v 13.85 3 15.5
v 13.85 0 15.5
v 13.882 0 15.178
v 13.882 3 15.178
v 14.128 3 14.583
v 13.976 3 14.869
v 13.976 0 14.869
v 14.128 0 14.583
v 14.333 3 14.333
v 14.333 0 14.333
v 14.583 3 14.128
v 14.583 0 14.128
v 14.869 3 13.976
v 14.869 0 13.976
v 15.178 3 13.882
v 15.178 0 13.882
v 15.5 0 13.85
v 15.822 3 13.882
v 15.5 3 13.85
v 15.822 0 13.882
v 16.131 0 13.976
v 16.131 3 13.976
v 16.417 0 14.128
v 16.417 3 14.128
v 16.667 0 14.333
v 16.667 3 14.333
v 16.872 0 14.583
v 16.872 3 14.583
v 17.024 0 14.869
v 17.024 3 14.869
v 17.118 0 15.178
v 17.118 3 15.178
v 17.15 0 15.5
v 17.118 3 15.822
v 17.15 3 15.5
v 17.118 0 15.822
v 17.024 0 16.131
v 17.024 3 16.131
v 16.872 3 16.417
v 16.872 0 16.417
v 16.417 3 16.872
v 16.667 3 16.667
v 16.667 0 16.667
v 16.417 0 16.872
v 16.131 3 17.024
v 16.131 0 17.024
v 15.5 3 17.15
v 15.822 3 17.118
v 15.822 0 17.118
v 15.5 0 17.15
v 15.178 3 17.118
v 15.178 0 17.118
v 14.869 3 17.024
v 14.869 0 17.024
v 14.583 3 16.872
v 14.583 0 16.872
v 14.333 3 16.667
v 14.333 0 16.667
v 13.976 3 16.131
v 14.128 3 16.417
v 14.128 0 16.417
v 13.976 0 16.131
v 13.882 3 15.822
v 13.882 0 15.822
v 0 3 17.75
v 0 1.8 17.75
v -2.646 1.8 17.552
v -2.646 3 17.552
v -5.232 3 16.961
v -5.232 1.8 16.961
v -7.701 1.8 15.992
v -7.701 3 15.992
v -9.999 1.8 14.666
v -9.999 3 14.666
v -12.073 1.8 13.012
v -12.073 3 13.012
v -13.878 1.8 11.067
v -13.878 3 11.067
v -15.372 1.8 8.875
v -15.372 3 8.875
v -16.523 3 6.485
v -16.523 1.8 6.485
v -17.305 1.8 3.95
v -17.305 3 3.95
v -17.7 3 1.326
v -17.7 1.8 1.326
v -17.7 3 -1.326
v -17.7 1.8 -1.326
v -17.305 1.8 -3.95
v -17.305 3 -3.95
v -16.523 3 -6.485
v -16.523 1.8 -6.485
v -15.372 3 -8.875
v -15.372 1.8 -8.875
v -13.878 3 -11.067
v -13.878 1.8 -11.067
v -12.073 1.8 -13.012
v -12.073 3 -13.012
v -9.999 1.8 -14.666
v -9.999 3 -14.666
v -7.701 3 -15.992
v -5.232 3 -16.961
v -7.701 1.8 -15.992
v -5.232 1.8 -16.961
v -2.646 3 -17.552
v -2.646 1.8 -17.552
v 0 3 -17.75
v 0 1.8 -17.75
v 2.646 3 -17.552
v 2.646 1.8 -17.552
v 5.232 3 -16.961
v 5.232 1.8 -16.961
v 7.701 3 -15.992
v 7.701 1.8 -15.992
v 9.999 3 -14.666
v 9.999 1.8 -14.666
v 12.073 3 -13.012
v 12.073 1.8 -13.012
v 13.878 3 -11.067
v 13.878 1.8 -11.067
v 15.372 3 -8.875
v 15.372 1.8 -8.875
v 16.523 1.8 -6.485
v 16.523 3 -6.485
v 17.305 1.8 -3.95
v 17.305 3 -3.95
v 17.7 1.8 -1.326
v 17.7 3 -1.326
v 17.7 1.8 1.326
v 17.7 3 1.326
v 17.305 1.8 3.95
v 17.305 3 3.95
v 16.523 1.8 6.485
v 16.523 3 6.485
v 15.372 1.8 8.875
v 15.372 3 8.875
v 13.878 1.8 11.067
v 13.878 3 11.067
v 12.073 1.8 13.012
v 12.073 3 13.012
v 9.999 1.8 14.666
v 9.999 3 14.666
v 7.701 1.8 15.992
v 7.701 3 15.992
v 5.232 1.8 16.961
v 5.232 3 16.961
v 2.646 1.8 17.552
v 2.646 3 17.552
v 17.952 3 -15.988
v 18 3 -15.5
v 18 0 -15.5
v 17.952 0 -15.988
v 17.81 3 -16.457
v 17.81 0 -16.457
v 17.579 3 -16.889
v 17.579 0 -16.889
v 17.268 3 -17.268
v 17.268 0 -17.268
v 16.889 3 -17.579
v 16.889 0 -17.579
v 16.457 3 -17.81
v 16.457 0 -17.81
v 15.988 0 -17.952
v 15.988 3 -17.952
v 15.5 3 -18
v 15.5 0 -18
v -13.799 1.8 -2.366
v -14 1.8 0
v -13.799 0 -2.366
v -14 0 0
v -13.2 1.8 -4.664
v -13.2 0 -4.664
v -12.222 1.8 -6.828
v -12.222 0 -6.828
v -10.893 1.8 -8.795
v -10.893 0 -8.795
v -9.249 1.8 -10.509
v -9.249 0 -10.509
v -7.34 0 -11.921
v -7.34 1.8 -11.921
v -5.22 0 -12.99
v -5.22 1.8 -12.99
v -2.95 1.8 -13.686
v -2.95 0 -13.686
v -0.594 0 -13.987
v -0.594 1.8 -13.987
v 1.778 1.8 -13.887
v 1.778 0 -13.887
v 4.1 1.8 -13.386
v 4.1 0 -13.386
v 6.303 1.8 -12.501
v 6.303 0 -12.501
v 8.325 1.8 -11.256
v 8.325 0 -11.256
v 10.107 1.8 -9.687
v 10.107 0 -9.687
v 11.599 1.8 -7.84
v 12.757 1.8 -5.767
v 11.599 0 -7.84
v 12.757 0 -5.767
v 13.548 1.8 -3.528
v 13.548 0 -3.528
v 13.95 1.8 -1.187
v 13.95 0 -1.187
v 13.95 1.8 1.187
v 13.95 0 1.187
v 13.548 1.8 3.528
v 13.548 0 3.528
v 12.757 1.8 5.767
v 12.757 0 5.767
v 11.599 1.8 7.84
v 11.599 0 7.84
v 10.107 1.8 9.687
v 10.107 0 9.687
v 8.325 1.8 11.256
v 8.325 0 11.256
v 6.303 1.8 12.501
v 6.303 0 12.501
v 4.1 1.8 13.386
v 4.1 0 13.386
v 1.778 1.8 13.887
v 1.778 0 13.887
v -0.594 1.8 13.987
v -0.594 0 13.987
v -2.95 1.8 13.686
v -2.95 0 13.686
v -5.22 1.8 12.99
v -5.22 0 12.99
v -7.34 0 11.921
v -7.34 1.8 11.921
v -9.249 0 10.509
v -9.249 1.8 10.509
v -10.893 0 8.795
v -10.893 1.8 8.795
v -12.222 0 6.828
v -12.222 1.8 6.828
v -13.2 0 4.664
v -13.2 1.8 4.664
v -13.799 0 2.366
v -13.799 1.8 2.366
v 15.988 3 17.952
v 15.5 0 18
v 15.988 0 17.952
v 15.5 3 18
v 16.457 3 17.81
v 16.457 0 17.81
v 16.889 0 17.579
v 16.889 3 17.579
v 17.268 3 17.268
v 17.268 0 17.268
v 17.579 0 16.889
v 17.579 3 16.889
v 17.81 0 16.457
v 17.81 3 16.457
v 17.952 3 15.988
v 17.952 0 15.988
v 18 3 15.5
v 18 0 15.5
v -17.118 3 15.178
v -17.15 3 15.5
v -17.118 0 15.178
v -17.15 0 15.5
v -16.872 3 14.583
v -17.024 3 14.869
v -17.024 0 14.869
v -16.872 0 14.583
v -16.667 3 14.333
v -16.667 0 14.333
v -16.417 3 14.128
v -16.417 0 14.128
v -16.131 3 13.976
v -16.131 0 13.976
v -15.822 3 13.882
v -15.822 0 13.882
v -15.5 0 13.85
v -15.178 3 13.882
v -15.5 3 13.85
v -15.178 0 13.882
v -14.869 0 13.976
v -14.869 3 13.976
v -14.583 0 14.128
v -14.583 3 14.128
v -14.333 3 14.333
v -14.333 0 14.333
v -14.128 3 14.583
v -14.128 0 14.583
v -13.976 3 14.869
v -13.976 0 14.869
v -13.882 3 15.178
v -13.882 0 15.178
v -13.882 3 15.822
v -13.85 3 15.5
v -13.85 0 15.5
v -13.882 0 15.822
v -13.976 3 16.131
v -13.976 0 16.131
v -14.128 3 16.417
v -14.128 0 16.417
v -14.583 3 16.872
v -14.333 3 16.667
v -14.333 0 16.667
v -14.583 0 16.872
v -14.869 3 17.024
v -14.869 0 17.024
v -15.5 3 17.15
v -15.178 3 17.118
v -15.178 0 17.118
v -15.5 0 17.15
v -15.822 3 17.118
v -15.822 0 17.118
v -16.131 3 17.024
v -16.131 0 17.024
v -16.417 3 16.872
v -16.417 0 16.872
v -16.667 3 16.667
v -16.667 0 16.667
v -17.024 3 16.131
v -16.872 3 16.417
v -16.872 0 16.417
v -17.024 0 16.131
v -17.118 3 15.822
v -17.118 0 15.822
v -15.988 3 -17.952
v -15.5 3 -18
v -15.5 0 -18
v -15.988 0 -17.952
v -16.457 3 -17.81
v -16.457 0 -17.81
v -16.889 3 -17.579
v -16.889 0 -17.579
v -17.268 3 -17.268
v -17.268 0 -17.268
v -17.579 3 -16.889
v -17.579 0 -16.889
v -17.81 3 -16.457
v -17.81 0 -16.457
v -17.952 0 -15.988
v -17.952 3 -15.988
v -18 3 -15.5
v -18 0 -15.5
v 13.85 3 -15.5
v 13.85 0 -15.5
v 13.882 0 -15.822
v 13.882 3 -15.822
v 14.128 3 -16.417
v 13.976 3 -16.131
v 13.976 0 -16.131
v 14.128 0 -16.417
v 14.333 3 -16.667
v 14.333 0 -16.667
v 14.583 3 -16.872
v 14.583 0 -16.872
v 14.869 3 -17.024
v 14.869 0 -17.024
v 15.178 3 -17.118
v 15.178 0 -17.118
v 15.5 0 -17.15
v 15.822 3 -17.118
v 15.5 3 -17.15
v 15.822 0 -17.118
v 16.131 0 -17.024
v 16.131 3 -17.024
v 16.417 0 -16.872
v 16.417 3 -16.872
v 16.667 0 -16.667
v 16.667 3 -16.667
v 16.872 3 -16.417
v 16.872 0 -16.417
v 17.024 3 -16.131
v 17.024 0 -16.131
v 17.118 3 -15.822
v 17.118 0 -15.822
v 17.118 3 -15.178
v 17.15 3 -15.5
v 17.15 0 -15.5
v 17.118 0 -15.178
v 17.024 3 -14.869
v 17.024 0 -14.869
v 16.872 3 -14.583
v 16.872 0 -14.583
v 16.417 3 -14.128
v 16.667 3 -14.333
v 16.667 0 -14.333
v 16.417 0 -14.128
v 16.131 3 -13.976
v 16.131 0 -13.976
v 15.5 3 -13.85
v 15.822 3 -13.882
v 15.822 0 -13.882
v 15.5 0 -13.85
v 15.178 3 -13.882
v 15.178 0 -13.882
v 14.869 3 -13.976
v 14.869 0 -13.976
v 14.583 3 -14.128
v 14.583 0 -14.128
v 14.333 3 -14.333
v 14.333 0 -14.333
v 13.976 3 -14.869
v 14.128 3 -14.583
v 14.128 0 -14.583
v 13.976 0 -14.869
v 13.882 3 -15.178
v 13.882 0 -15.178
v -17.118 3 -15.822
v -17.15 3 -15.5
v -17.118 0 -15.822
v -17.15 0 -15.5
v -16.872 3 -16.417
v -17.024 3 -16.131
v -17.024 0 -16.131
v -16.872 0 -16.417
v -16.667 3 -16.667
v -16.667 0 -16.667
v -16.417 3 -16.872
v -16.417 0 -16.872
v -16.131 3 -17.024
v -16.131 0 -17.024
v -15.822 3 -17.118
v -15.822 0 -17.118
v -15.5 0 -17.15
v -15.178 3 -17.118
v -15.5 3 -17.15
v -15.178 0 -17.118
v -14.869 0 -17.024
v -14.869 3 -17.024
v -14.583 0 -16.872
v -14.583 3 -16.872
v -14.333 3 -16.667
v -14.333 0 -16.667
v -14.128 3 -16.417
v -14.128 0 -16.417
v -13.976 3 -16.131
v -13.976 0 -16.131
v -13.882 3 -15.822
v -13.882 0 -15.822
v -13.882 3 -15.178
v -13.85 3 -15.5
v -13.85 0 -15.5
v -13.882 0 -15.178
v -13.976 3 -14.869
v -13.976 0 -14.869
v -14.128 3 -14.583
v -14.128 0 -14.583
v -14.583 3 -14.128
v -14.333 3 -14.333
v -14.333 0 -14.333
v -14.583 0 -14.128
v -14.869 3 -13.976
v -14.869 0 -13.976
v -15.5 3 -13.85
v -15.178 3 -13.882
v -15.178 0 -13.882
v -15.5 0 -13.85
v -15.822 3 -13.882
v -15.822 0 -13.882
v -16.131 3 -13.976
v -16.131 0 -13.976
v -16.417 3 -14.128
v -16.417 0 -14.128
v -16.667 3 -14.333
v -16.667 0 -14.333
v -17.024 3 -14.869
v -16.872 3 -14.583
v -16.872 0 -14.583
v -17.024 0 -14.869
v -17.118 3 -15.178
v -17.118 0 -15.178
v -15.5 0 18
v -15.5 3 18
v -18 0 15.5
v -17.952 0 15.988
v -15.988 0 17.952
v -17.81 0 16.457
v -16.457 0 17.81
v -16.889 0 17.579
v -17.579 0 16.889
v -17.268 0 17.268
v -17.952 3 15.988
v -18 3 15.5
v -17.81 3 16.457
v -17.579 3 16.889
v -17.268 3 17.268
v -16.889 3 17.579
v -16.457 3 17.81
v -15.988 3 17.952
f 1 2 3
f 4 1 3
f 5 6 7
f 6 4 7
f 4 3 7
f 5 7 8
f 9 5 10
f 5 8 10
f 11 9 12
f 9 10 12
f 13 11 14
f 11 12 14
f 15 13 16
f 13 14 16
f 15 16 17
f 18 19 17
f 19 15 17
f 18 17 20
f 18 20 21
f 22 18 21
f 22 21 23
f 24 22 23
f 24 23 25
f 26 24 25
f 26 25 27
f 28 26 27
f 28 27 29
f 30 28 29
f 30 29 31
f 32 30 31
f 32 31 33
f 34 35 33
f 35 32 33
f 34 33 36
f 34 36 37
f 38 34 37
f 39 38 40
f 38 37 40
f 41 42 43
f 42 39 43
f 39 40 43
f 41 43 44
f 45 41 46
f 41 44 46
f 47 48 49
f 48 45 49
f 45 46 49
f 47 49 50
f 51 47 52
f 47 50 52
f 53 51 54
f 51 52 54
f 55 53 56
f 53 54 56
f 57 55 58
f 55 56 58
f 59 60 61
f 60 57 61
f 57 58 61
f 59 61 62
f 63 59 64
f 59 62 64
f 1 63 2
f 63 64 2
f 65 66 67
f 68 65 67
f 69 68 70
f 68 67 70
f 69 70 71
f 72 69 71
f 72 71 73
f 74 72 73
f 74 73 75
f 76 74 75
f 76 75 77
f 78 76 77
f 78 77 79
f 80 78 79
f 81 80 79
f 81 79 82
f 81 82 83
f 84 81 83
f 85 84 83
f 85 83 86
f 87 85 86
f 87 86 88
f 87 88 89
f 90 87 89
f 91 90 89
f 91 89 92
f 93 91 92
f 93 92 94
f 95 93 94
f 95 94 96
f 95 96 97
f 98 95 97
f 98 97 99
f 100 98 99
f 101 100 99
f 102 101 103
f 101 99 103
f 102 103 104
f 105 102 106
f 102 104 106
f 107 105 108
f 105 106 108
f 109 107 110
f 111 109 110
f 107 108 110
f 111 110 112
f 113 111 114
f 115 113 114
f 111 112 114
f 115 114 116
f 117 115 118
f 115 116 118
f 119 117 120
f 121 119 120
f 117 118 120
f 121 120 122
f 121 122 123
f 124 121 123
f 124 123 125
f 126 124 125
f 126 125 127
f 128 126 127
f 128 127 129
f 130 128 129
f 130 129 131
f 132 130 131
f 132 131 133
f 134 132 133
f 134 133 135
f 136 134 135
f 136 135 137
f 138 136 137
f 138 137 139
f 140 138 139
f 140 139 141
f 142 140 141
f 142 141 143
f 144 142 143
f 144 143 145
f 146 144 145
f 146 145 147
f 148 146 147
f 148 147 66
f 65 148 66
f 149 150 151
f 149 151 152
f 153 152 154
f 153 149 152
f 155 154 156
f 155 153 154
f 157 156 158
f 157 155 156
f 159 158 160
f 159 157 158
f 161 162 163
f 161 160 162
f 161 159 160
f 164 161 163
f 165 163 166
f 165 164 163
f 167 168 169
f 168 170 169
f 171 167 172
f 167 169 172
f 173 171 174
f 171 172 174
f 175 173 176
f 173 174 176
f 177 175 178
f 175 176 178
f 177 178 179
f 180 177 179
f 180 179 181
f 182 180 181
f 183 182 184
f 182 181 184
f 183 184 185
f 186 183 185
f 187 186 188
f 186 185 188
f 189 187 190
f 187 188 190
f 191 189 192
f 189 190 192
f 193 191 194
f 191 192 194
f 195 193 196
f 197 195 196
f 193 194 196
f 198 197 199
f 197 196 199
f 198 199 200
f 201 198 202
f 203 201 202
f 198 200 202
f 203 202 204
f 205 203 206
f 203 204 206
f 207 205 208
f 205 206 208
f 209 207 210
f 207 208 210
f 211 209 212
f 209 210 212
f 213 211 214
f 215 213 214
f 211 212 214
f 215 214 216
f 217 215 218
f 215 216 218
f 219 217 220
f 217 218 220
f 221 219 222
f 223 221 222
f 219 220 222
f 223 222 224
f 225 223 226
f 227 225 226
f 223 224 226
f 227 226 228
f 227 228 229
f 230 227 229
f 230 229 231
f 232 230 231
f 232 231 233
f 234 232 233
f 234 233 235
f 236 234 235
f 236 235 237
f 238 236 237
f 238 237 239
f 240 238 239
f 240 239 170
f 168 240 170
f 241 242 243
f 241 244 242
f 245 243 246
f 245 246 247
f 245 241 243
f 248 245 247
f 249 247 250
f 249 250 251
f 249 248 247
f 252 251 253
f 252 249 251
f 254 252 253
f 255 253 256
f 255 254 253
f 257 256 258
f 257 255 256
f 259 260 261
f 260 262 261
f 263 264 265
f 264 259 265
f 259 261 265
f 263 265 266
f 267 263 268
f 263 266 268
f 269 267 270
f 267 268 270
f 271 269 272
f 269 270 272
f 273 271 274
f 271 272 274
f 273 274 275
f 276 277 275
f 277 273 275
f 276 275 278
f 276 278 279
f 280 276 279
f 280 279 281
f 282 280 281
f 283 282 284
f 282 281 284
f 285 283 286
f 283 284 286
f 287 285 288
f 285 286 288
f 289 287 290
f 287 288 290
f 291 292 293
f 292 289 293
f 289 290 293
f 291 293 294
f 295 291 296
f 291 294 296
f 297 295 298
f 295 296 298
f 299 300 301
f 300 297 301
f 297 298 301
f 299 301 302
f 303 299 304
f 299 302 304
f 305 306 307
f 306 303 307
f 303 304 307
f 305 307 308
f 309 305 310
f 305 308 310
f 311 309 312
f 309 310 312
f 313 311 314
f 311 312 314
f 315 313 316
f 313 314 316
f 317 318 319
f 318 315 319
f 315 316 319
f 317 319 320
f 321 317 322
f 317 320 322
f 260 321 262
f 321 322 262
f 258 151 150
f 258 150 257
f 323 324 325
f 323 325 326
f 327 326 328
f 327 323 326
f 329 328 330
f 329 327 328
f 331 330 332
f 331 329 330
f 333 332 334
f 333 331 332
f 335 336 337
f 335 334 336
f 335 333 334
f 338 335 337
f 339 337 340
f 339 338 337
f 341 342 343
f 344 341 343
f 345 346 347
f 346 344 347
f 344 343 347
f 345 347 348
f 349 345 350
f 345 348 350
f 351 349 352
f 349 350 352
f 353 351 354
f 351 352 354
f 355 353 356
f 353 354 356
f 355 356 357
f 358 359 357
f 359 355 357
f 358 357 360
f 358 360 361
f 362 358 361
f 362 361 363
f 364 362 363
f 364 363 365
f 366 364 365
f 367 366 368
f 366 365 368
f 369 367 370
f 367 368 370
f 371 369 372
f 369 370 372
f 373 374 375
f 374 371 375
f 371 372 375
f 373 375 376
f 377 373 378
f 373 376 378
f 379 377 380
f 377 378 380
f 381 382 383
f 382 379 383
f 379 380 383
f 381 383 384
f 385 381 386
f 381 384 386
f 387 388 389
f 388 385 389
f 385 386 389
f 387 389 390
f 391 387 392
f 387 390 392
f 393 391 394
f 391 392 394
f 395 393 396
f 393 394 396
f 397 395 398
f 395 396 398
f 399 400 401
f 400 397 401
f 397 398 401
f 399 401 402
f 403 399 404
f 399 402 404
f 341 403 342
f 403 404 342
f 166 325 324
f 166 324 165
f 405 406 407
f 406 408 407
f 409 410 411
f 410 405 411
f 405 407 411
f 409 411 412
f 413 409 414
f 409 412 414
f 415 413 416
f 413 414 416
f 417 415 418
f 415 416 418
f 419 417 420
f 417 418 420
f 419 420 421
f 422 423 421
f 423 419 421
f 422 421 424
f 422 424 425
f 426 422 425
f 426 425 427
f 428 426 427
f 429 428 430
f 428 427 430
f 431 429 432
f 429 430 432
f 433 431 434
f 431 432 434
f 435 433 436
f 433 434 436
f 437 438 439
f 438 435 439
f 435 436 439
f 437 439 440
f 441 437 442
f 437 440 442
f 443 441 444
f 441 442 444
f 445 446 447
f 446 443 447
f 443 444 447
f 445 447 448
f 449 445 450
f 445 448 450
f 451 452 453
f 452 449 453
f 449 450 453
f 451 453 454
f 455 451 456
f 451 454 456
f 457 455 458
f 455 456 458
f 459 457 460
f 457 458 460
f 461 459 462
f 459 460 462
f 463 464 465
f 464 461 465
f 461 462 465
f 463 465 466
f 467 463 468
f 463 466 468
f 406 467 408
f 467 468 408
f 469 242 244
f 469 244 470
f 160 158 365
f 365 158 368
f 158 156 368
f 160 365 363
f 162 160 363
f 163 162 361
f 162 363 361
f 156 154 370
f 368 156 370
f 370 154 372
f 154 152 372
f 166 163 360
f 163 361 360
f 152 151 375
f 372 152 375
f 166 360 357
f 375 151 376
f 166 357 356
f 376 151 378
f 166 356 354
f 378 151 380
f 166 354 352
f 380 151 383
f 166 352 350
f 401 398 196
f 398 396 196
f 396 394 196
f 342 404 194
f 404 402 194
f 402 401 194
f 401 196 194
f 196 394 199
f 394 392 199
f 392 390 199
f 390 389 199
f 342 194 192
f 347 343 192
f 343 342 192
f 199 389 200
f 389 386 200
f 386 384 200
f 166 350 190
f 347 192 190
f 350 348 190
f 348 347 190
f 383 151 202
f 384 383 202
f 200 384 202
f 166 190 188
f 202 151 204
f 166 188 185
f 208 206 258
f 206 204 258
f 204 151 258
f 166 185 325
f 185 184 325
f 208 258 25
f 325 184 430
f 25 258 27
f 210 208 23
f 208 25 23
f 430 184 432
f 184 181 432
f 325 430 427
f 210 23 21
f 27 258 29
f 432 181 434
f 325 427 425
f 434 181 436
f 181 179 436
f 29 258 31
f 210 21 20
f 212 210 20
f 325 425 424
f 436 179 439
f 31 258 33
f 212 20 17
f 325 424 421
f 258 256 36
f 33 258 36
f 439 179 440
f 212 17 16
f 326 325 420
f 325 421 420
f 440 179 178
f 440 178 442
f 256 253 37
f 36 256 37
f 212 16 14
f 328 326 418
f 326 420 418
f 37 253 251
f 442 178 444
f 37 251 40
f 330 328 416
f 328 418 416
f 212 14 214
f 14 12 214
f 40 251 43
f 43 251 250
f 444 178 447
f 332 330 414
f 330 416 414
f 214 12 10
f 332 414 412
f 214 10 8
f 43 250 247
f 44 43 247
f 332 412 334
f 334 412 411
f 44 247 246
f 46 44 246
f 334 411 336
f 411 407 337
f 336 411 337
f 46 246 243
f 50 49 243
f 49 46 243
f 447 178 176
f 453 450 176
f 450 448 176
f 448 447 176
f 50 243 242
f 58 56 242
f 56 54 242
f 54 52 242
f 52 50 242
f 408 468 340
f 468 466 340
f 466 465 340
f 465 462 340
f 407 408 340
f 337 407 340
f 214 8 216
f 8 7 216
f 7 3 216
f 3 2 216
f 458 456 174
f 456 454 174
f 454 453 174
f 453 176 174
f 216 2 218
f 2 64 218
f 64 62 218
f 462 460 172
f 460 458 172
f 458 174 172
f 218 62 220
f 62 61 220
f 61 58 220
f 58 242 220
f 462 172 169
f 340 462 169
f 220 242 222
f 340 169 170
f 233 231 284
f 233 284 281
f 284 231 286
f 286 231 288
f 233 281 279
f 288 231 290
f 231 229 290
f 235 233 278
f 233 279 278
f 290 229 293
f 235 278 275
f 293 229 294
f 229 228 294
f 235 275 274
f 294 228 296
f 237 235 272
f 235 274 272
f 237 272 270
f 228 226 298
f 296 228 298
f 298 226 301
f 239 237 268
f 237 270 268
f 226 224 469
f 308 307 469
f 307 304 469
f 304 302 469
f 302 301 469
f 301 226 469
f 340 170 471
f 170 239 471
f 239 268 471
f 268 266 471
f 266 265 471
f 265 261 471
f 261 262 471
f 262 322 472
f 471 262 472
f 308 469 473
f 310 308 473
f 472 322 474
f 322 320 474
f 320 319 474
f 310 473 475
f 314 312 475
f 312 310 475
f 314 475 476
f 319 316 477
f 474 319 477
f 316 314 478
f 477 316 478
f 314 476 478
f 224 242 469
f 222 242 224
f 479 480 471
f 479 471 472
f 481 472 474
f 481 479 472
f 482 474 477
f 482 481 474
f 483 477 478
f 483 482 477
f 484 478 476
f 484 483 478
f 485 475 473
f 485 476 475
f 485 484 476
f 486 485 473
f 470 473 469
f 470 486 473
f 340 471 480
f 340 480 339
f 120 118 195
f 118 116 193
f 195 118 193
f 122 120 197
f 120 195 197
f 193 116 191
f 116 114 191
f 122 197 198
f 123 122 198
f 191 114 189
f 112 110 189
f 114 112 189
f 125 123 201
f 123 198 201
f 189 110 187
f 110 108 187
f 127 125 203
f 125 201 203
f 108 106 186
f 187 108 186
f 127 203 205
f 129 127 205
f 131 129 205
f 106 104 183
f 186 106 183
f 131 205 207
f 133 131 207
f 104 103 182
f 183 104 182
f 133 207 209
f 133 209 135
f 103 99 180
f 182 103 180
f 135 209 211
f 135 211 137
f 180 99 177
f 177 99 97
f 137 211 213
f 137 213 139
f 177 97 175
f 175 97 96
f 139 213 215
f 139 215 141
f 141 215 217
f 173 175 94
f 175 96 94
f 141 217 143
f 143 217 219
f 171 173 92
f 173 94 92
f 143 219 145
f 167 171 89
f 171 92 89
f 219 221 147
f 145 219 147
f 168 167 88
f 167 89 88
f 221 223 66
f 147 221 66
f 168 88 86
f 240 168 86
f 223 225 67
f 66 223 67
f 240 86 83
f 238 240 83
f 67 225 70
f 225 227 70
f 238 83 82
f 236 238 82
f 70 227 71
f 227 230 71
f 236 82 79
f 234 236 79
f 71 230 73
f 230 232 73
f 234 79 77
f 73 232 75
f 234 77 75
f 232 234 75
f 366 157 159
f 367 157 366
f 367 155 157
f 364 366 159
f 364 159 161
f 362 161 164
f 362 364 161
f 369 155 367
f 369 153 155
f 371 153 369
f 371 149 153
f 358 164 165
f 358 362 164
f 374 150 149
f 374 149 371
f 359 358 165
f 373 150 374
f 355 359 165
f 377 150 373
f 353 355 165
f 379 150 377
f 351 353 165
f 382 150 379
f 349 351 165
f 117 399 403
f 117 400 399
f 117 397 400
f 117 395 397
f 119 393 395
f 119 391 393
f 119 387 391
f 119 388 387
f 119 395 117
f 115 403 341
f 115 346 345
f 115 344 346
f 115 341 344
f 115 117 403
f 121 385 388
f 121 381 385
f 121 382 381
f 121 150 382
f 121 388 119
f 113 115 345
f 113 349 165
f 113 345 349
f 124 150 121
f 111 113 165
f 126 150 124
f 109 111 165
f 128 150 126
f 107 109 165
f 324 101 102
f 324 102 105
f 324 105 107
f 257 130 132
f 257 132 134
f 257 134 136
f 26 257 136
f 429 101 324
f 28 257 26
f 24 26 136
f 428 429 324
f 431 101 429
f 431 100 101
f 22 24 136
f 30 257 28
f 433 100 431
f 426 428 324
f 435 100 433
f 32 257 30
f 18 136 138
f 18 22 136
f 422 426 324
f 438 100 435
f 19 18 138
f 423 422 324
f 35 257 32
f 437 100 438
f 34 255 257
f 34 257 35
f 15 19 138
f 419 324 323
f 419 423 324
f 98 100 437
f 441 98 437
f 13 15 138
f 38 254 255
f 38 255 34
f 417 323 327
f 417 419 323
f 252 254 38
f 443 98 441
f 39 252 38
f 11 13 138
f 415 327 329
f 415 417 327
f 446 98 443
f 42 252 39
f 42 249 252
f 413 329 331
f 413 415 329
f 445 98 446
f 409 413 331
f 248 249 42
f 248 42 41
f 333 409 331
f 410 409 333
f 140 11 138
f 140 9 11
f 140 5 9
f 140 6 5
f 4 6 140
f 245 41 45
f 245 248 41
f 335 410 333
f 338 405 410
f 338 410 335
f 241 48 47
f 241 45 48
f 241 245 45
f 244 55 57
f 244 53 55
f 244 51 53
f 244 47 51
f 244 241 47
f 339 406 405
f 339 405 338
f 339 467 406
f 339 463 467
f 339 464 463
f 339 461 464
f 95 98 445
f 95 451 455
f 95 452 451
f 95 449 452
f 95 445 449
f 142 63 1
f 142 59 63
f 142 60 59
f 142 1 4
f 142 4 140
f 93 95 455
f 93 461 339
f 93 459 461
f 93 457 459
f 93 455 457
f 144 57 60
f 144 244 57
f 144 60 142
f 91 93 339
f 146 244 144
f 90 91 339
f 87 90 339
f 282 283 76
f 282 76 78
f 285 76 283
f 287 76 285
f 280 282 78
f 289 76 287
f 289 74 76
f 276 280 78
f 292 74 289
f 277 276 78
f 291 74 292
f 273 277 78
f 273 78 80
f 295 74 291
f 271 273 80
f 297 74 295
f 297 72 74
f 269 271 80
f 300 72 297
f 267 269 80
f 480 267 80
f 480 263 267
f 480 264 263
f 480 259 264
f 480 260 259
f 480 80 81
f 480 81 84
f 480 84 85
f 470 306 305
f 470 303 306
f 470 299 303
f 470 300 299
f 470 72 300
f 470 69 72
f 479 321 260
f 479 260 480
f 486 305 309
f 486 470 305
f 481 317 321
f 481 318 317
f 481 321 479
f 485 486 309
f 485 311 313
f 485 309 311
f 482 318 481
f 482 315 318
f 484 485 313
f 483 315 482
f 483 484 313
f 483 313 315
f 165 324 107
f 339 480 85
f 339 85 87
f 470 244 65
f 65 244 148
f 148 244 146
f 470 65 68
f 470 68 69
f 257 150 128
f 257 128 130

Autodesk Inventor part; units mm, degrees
ref_plane "YZ Plane" through (0, 0, 0) normal (1, 0, 0) x (0, 1, 0)
ref_plane "XZ Plane" through (0, 0, 0) normal (0, 1, 0) x (-1, 0, 0)
ref_plane "XY Plane" through (0, 0, 0) normal (0, 0, 1) x (1, 0, 0)
sketch "Sketch1" plane through (0, 0, 0) normal (0, 1, 0) x (-1, 0, 0)
  line L0 (-18, 18) -> (18, 18)
  line L1 (18, 18) -> (18, -18)
  line L2 (18, -18) -> (-18, -18)
  line L3 (-18, -18) -> (-18, 18)
  line L4 (-18, 18) -> (18, -18) construction
  line L5 (18, 18) -> (-18, -18) construction
  circle A0 centre (15.5, -15.5) radius 1.65
  circle A1 centre (15.5, 15.5) radius 1.65
  circle A2 centre (-15.5, 15.5) radius 1.65
  circle A3 centre (-15.5, -15.5) radius 1.65
  circle A4 centre (0, 0) radius 14
  dimension "d0" = 36
  dimension "d1" = 36
  dimension "d2" = 3.3
  dimension "d3" = 3.3
  dimension "d4" = 3.3
  dimension "d5" = 3.3
  dimension "d6" = 2.5
  dimension "d7" = 2.5
  dimension "d8" = 2.5
  dimension "d9" = 2.5
  dimension "d10" = 28
extrude "Extrusion1" add sketch "Sketch1" along normal blind 3
fillet "Fillet1" radius 2.5 4 edges at (-18, 1.5, 18) (18, 1.5, 18) (18, 1.5, -18) (-18, 1.5, -18)
sketch "Sketch2" plane through (0, 3, 0) normal (0, 1, 0) x (1, 0, 0)
  circle A0 centre (0, 0) radius 14 projected
hole "Hole1" at (0, 3, 0) direction (0, -1, 0) diameter 35.5 depth 1.2
properties part number "Bearing Block P2" material "Aluminum 6061"
